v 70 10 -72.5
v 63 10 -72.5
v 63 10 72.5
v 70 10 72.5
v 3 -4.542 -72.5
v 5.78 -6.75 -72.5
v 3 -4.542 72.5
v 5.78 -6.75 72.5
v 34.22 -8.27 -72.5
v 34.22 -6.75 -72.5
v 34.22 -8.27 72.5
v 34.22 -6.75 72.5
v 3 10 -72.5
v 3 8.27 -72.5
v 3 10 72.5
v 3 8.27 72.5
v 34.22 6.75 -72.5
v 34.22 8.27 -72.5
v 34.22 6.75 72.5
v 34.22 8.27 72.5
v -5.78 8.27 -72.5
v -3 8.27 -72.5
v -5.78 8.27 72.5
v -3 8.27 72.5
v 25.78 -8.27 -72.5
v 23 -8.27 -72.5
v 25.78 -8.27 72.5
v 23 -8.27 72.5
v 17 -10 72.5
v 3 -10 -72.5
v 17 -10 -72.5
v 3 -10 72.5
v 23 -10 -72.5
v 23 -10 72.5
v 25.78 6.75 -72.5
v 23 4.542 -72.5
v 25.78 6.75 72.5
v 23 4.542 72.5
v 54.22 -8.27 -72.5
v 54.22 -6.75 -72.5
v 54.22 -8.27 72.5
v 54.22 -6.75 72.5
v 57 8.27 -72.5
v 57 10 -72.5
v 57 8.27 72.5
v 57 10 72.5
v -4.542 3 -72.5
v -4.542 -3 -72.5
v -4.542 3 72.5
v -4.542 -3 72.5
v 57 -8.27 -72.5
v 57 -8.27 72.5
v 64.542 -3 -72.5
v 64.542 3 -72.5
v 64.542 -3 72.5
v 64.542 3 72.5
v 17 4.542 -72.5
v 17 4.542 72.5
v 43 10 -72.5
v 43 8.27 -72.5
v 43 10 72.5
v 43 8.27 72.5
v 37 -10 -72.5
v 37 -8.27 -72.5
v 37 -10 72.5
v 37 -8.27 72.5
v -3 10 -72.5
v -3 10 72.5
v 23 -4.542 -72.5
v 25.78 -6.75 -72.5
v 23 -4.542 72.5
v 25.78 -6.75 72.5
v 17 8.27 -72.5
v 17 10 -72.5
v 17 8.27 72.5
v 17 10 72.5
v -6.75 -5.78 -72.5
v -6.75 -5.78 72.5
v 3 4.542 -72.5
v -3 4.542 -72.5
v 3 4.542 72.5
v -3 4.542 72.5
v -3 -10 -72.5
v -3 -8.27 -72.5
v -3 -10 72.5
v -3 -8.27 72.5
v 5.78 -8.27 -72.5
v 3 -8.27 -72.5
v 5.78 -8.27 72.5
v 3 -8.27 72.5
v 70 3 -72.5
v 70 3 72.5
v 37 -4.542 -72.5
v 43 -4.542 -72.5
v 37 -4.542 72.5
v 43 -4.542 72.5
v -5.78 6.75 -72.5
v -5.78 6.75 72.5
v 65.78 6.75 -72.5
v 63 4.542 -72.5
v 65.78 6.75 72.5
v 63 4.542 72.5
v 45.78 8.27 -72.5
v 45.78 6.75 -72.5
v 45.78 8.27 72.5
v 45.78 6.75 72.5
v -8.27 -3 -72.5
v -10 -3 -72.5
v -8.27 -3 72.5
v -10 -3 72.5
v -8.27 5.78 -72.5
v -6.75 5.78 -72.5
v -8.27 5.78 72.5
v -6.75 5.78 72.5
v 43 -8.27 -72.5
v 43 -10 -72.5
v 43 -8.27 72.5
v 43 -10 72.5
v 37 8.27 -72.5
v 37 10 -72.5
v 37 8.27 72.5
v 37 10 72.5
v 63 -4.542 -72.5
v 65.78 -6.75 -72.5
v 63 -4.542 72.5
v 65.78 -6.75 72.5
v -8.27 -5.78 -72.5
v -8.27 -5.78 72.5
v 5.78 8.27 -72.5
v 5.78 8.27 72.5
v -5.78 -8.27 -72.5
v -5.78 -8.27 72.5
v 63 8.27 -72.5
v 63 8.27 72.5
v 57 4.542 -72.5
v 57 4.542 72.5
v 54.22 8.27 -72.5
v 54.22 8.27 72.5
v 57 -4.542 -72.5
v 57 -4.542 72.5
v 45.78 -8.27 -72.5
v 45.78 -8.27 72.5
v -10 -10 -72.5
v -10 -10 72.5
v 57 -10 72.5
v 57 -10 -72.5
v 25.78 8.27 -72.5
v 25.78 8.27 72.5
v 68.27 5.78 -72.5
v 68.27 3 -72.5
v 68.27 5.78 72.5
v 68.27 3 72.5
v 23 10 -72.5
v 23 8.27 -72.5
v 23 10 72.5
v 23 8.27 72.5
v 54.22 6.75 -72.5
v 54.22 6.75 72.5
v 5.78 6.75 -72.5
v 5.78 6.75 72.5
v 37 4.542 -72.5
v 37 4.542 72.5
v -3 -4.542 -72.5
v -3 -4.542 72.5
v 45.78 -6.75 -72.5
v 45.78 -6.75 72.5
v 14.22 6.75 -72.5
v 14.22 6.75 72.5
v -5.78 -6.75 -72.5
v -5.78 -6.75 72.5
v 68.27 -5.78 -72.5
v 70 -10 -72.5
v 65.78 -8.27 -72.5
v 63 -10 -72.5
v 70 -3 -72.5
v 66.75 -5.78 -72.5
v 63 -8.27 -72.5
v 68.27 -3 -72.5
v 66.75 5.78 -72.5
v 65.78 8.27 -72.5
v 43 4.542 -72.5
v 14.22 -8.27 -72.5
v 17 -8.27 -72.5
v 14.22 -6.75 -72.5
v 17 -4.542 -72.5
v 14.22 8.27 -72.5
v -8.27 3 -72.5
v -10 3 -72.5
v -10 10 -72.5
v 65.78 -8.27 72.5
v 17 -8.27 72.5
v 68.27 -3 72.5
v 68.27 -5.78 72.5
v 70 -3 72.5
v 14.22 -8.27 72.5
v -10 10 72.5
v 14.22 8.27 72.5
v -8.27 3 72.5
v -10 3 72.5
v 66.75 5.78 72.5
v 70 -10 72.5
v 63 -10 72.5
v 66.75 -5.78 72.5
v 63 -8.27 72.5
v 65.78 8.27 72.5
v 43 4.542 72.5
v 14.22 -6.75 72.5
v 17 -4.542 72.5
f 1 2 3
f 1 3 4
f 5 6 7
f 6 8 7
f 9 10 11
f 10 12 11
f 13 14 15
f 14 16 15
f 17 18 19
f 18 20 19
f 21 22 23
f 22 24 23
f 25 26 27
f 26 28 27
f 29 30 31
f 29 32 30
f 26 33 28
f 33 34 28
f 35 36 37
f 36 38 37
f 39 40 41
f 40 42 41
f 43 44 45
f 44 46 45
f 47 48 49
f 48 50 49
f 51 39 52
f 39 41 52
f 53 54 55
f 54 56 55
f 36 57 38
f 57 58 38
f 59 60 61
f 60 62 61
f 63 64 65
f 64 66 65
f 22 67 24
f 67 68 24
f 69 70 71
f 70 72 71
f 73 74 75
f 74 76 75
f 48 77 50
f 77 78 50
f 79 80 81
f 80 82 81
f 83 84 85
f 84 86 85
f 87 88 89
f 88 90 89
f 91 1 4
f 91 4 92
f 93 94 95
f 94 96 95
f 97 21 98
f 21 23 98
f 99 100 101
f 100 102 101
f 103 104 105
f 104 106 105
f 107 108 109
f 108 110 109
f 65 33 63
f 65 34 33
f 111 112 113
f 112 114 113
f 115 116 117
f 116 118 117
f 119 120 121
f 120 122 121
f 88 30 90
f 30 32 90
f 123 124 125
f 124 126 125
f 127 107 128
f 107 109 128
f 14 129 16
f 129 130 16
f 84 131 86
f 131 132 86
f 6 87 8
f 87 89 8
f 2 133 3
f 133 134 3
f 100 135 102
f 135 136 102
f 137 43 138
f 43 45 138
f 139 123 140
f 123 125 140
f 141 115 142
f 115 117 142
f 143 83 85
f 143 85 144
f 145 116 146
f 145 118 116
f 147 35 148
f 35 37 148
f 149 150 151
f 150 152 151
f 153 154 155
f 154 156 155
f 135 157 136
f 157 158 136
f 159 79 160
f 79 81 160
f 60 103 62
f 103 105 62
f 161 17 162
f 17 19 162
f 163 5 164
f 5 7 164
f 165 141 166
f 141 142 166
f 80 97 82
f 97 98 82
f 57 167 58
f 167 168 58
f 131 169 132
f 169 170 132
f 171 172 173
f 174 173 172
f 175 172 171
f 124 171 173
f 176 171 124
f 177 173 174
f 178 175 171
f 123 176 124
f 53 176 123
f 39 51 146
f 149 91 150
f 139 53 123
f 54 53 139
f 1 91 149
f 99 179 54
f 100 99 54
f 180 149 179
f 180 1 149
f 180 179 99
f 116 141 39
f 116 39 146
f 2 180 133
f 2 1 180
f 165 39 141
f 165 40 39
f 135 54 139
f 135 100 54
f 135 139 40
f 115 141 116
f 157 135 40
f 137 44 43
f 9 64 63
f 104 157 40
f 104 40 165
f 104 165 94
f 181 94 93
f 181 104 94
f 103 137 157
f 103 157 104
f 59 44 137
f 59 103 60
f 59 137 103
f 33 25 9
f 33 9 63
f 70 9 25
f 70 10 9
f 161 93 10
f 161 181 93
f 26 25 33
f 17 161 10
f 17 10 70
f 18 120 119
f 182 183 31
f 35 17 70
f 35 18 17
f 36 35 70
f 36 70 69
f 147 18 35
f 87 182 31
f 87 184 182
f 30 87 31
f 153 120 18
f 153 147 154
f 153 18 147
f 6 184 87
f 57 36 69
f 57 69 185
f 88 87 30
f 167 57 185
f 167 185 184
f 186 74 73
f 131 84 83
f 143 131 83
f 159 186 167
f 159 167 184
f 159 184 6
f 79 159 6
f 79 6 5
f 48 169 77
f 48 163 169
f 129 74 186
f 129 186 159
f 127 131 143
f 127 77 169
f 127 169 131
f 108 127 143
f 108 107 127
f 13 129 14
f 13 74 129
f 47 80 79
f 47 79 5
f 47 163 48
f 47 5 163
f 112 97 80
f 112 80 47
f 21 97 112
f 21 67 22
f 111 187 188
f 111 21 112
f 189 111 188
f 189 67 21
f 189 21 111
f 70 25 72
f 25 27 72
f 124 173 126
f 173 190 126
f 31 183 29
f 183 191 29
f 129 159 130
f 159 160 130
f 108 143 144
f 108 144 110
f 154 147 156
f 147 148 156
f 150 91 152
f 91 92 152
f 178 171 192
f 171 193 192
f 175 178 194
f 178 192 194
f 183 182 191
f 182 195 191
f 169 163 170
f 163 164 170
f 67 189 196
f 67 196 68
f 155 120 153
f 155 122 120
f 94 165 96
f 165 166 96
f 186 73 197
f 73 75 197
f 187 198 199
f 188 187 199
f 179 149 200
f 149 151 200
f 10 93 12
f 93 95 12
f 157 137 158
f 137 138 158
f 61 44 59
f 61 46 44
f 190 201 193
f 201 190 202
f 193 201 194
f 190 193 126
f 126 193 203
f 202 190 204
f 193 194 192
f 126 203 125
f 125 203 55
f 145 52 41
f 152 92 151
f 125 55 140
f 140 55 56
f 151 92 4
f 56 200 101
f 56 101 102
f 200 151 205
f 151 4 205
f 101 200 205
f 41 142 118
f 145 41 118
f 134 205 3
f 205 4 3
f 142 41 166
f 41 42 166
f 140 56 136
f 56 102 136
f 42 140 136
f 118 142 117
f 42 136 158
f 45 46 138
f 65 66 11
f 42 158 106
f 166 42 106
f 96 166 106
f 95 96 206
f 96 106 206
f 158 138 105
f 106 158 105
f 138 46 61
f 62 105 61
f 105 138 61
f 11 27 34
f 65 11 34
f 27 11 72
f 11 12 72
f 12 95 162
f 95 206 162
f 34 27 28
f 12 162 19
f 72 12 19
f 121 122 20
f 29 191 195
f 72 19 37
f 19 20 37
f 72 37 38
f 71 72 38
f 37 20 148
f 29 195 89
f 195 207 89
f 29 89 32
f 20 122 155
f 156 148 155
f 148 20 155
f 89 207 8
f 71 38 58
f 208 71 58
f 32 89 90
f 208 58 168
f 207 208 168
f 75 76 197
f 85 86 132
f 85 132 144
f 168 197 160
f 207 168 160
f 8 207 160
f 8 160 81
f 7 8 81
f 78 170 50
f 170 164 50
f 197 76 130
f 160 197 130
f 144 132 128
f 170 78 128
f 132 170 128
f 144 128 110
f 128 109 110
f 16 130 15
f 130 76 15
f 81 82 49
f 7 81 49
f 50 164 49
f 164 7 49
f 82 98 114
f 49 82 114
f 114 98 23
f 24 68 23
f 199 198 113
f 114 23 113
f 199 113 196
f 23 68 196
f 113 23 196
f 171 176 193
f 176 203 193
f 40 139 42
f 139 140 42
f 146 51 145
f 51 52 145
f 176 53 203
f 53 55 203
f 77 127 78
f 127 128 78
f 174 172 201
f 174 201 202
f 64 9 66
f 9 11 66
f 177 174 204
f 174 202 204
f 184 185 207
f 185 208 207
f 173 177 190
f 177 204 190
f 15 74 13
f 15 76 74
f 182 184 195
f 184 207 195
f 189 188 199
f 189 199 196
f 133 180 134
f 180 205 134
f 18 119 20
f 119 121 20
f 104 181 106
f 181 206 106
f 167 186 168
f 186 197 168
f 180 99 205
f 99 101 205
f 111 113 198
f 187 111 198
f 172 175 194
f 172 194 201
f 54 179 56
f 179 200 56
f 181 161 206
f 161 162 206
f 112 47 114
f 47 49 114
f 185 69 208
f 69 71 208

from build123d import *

# Parameters (mm, degrees)
BOSS_EXTRUDE1_DEPTH = 72.5


with BuildPart() as part:
    # Sketch1 → Boss-Extrude1 (new, symmetric)
    with BuildSketch(Plane.XY):
        Polygon((-10, 3), (-10, 10), (-3, 10), (-3, 8.27), (-5.78, 8.27), (-5.78, 6.75), (-3, 4.542263603), (3, 4.542263603), (5.78, 6.75), (5.78, 8.27), (3, 8.27), (3, 10), (10, 10), (17, 10), (17, 8.27), (14.22, 8.27), (14.22, 6.75), (17, 4.542263603), (23, 4.542263603), (25.78, 6.75), (25.78, 8.27), (23, 8.27), (23, 10), (30, 10), (37, 10), (37, 8.27), (34.22, 8.27), (34.22, 6.75), (37, 4.542263603), (43, 4.542263603), (45.78, 6.75), (45.78, 8.27), (43, 8.27), (43, 10), (50, 10), (57, 10), (57, 8.27), (54.22, 8.27), (54.22, 6.75), (57, 4.542263603), (63, 4.542263603), (65.78, 6.75), (65.78, 8.27), (63, 8.27), (63, 10), (70, 10), (70, 3), (68.27, 3), (68.27, 5.78), (66.75, 5.78), (64.542263603, 3), (64.542263603, -3), (66.75, -5.78), (68.27, -5.78), (68.27, -3), (70, -3), (70, -10), (63, -10), (63, -8.27), (65.78, -8.27), (65.78, -6.75), (63, -4.542263603), (57, -4.542263603), (54.22, -6.75), (54.22, -8.27), (57, -8.27), (57, -10), (50, -10), (43, -10), (43, -8.27), (45.78, -8.27), (45.78, -6.75), (43, -4.542263603), (37, -4.542263603), (34.22, -6.75), (34.22, -8.27), (37, -8.27), (37, -10), (30, -10), (23, -10), (23, -8.27), (25.78, -8.27), (25.78, -6.75), (23, -4.542263603), (17, -4.542263603), (14.22, -6.75), (14.22, -8.27), (17, -8.27), (17, -10), (10, -10), (3, -10), (3, -8.27), (5.78, -8.27), (5.78, -6.75), (3, -4.542263603), (-3, -4.542263603), (-5.78, -6.75), (-5.78, -8.27), (-3, -8.27), (-3, -10), (-10, -10), (-10, -3), (-8.27, -3), (-8.27, -5.78), (-6.75, -5.78), (-4.542263603, -3), (-4.542263603, 3), (-6.75, 5.78), (-8.27, 5.78), (-8.27, 3), align=None)
    extrude(amount=BOSS_EXTRUDE1_DEPTH, both=True)


solid = part.part
